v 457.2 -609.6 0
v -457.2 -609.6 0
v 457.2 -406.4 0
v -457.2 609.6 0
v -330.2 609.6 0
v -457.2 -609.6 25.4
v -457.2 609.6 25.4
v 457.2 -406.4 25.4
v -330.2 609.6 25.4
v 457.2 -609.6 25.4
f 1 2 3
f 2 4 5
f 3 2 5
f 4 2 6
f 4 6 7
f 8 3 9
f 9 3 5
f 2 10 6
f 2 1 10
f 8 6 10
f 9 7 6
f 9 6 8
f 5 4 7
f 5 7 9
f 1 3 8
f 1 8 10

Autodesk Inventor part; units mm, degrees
ref_plane "YZ Plane" through (0, 0, 0) normal (1, 0, 0) x (0, 1, 0)
ref_plane "XZ Plane" through (0, 0, 0) normal (0, 1, 0) x (-1, 0, 0)
ref_plane "XY Plane" through (0, 0, 0) normal (0, 0, 1) x (1, 0, 0)
sketch "Sketch1" plane through (0, 0, 0) normal (0, 0, 1) x (1, 0, 0)
  line L0 (457.2, -406.4) -> (457.2, -609.6)
  line L1 (457.2, -609.6) -> (-457.2, -609.6)
  line L2 (-457.2, -609.6) -> (-457.2, 609.6)
  line L3 (-457.2, 609.6) -> (-330.2, 609.6)
  line L4 (762.0015, 0.0045) -> (-761.9985, -0.0045) construction
  line L5 (457.2, -609.6) -> (-457.2, 609.6) construction
  line L6 (457.2, -406.4) -> (-330.2, 609.6)
  point P0 (0, 0)
  dimension "d0" = 681.5582
  dimension "d1" = 914.4
  dimension "d2" = 203.2
  dimension "d3" = 127
  dimension "d4" = 1219.2
extrude "Extrusion1" add sketch "Sketch1" along normal blind 25.4
properties part number "stock wall triangl"
